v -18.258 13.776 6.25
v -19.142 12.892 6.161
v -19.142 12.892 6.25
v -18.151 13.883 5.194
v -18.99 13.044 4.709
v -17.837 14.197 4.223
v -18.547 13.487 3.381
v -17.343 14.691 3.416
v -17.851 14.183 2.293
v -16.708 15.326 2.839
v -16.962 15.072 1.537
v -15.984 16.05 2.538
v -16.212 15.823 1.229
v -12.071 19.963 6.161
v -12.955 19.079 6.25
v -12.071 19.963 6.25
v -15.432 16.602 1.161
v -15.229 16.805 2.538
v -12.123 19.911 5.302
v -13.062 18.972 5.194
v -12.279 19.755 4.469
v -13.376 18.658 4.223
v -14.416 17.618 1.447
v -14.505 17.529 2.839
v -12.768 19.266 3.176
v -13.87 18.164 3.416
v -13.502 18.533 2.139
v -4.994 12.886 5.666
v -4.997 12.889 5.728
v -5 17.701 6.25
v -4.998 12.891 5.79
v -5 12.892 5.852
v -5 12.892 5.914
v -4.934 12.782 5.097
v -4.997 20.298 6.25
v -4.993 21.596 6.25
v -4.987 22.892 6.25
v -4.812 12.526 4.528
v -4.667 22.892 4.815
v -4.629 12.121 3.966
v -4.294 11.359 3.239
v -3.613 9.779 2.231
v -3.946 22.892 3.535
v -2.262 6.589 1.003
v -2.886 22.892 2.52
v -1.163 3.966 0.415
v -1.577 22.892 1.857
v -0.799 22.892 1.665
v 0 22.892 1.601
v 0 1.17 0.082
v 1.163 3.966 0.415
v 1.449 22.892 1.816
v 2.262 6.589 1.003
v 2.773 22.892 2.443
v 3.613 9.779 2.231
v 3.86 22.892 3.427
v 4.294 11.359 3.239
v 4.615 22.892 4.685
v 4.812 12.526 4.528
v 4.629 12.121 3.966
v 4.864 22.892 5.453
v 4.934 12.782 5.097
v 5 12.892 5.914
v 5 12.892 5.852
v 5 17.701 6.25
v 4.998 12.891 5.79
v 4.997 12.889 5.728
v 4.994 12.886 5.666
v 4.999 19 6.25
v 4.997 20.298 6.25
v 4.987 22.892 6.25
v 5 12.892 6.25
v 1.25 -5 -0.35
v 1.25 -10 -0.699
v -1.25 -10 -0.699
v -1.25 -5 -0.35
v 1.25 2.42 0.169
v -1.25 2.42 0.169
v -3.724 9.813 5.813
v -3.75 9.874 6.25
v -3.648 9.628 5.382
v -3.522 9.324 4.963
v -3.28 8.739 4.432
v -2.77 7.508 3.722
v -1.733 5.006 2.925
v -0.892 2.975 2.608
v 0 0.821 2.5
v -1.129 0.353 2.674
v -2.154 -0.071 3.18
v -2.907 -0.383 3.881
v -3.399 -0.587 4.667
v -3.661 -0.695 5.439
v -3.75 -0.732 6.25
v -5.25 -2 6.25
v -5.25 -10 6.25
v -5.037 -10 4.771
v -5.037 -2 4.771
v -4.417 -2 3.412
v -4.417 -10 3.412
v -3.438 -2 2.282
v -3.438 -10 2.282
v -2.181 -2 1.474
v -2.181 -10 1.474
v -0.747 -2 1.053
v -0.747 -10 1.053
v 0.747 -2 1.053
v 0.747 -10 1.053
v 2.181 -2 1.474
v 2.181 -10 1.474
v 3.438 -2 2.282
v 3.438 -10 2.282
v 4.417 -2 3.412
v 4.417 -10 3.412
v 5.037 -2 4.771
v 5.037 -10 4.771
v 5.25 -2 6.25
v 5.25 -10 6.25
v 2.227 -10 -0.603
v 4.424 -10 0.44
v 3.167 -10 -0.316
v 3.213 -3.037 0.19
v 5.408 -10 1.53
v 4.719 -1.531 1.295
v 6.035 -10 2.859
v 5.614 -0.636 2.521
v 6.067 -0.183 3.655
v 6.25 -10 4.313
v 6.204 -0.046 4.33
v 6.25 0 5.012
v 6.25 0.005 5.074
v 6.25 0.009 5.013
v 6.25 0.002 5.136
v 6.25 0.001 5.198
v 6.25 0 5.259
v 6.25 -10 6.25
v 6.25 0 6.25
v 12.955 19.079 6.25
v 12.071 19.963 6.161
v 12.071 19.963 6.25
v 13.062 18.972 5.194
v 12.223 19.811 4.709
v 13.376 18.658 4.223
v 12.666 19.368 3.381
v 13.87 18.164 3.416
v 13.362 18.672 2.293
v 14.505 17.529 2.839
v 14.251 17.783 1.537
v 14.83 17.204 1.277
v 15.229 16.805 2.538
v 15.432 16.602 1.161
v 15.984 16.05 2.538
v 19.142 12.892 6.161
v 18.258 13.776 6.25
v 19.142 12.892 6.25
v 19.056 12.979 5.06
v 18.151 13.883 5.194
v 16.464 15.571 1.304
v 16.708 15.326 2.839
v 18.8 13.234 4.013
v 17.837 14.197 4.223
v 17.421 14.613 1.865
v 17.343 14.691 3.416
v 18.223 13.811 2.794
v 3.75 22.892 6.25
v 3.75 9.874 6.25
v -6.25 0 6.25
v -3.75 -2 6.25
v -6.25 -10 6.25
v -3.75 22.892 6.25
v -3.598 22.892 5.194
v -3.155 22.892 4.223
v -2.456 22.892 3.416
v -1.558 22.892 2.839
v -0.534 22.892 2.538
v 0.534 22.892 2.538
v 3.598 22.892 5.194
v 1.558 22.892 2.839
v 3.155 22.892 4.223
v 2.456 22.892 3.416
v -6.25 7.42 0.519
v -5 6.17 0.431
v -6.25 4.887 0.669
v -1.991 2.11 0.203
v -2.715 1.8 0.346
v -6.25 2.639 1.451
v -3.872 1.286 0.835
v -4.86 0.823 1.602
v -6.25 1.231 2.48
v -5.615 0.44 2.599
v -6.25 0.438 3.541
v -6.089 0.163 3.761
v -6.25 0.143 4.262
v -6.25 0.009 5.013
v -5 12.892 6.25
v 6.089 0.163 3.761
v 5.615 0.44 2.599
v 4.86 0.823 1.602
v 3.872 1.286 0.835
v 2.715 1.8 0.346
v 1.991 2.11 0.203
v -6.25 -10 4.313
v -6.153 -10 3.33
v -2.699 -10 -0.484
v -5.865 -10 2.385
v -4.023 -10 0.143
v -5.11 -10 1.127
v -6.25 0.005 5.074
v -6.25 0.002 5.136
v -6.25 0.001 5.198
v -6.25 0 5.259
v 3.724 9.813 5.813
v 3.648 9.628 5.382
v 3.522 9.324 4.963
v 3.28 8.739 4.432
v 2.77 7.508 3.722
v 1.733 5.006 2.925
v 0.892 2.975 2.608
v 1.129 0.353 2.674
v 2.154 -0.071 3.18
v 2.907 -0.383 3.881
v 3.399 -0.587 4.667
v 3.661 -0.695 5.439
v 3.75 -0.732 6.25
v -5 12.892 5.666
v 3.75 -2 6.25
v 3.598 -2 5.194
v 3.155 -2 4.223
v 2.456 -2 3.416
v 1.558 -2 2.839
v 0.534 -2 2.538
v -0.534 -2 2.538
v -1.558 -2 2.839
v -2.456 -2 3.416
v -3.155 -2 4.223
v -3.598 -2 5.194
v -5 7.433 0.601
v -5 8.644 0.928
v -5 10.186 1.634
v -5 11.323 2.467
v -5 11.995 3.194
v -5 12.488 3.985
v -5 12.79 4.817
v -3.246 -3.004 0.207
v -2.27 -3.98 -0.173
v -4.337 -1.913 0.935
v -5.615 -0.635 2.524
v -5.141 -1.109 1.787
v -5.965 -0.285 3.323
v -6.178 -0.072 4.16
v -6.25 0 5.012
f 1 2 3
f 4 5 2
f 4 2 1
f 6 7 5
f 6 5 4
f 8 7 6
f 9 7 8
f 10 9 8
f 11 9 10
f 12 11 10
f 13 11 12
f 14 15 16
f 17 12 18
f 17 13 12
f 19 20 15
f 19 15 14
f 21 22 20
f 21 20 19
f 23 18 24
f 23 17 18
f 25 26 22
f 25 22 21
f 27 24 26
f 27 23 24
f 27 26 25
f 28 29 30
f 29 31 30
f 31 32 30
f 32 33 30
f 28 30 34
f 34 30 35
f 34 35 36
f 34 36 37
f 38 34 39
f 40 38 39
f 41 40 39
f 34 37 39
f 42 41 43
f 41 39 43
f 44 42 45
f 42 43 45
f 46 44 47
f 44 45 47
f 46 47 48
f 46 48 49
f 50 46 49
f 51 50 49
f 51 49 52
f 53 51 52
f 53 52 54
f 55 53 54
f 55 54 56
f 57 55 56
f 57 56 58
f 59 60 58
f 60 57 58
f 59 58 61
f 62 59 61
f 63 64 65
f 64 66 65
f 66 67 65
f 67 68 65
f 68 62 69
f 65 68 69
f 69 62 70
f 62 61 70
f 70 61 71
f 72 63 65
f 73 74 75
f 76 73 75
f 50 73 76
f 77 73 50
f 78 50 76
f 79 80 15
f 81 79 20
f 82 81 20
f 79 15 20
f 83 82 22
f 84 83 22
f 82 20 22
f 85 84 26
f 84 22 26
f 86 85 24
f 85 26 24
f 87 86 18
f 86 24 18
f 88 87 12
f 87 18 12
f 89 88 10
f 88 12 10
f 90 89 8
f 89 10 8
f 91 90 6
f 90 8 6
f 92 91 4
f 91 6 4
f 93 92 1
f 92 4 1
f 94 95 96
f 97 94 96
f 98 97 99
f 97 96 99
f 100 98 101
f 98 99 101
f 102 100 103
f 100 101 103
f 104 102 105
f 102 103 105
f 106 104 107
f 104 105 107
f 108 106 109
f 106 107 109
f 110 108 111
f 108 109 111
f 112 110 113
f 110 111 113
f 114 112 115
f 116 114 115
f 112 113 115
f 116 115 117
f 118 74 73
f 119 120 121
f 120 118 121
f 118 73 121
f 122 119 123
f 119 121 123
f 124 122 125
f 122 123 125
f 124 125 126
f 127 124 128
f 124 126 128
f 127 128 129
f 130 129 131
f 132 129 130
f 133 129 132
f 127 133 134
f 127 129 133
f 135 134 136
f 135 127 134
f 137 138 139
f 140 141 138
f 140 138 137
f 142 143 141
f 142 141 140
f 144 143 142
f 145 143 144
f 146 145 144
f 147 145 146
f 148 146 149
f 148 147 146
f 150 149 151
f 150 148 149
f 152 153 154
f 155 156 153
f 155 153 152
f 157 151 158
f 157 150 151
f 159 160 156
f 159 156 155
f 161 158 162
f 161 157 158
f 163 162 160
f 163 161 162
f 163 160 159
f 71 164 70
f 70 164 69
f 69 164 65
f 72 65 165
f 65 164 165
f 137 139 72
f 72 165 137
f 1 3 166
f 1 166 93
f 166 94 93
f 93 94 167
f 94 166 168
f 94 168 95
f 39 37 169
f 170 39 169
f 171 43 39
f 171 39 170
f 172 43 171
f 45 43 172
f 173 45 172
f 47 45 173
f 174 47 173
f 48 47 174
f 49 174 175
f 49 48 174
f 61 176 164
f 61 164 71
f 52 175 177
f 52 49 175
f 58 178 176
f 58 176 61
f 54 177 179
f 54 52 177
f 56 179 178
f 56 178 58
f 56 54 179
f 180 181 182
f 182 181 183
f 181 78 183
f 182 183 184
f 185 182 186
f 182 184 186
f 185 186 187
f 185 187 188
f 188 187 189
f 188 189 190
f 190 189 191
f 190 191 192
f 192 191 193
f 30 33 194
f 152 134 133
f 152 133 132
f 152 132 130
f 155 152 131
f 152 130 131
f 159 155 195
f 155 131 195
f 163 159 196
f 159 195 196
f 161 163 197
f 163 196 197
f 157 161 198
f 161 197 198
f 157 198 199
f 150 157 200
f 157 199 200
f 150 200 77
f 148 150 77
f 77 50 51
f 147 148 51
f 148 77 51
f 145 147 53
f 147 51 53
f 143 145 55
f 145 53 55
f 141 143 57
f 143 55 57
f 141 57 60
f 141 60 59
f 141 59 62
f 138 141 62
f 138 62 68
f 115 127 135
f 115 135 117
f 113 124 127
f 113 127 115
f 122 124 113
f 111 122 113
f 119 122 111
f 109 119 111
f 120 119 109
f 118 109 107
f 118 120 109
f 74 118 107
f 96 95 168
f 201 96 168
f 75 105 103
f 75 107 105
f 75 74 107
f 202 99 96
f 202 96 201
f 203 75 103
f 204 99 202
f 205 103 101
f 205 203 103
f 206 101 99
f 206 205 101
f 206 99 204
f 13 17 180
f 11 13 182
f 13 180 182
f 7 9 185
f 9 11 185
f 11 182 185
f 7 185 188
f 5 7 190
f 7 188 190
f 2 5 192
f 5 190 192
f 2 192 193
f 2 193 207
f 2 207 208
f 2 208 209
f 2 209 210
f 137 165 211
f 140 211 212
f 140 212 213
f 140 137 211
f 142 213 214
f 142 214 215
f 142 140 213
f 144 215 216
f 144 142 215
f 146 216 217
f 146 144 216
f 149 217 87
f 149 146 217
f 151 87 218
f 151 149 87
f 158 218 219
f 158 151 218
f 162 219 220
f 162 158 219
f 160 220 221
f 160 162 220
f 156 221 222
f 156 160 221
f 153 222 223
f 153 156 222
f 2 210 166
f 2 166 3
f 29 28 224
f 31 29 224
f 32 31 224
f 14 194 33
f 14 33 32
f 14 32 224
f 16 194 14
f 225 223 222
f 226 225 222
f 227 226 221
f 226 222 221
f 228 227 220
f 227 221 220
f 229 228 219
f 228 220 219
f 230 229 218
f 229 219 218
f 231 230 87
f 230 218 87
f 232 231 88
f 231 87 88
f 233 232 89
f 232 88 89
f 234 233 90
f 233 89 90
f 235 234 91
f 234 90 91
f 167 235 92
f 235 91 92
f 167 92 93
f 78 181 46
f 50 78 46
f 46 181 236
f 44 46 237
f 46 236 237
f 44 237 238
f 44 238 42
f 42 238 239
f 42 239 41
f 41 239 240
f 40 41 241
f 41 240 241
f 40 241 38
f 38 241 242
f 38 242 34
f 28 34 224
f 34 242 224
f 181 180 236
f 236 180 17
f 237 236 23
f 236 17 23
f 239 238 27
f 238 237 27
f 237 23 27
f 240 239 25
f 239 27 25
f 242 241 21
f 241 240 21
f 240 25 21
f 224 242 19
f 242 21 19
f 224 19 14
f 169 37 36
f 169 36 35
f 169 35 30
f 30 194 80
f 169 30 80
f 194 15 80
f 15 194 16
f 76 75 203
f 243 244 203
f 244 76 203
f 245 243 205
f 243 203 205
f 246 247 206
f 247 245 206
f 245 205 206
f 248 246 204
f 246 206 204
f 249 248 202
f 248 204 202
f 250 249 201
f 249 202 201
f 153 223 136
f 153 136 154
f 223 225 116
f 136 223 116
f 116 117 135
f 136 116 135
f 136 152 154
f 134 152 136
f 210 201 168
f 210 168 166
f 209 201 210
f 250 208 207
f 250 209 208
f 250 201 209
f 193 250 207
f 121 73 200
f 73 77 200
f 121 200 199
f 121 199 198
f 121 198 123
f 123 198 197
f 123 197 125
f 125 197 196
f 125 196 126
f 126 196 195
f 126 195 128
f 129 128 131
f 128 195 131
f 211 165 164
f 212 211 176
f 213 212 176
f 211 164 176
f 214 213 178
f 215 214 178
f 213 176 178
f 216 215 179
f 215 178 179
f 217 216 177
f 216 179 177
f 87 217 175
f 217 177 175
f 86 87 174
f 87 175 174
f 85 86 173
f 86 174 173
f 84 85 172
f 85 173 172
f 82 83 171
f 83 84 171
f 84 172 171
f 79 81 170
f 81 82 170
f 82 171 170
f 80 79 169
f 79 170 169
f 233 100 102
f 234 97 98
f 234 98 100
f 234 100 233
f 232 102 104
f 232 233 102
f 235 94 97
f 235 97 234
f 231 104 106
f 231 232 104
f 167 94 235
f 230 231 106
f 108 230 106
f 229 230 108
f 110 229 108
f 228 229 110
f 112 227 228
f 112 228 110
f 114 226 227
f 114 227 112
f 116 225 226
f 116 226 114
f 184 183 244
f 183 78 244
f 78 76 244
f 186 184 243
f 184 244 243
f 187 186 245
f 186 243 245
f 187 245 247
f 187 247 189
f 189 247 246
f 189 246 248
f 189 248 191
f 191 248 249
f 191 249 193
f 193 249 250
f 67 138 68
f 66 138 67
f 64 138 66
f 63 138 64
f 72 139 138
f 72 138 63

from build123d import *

# Parameters (mm, degrees)
EXTRUDE_634_DEPTH           = 12.5
SKETCH_4_R                  = 3.75
CUT_EXTRUDE_991_DEPTH       = 41.057008652
CUT_EXTRUDE_1141_REACH      = 47.49
CUT_EXTRUDE_1141_END_RADIUS = 3.75
SKETCH_5_R                  = 3.75
SKETCH_9_R                  = 5.25
CUT_EXTRUDE_1315_DEPTH      = 8
DRAFT_2_ANGLE               = 4
FILLET_8_R                  = 5
SKETCH_10_W                 = 49.037593782
SKETCH_10_H                 = 8.594475989
CUT_EXTRUDE_3_DEPTH         = 41.280697872


with BuildPart() as part:
    # Эскиз3 → Extrude 634 (new body)
    with BuildSketch(Plane.XY):
        Polygon((-6.25, 0), (-19.142135624, 12.892135624), (-12.071067812, 19.963203436), (-5, 12.892135624), (-5, 22.892135624), (5, 22.892135624), (5, 12.892135624), (12.071067812, 19.963203436), (19.142135624, 12.892135624), (6.25, 0), (6.25, -10), (-6.25, -10), align=None)
    extrude(amount=EXTRUDE_634_DEPTH)

    # Эскиз4 → Cut-Extrude 991 (cut, through all)
    with BuildSketch(Plane(origin=(0, 22.892135624, 0), x_dir=(-1, 0, 0), z_dir=(0, 1, 0))):
        with Locations(Location((0, 6.25, 0), (0, 0, 90))):
            Circle(SKETCH_4_R)
    extrude(amount=-CUT_EXTRUDE_991_DEPTH, mode=Mode.SUBTRACT)

    # Cut-Extrude 1141: up to this cylinder (the profile starts outside it)
    cut_extrude_1141_end = Plane(origin=(0, 16.42767, 6.25), z_dir=(0, 1, 0)) * Cylinder(CUT_EXTRUDE_1141_END_RADIUS, 103.48, mode=Mode.PRIVATE)
    # Эскиз5 → Cut-Extrude 1141 (cut, up to the surface)
    with BuildSketch(Plane(origin=(-16.017135624, 16.017135624, 0), x_dir=(0, 0, 1), z_dir=(-0.707106781186544, 0.7071067811865511, 0)), mode=Mode.PRIVATE) as cut_extrude_1141_sk1:
        with Locations(Location((6.25, 0.580582618, 0), (0, 0, 270))):
            Circle(SKETCH_5_R)
    cut_extrude_1141_tool1 = extrude(cut_extrude_1141_sk1.sketch, amount=-CUT_EXTRUDE_1141_REACH, mode=Mode.PRIVATE) - cut_extrude_1141_end
    cut_extrude_1141 = cut_extrude_1141_tool1.solids().sort_by_distance((-15.606602, 16.42767, 6.25))[0]
    add(cut_extrude_1141, mode=Mode.SUBTRACT)

    # Зеркальное отражение1: Cut-Extrude 1141 across plane
    add(cut_extrude_1141.mirror(Plane(origin=(0, 0, 0), x_dir=(0, 0, 1), z_dir=(1, 0, 0))), mode=Mode.SUBTRACT)

    # Эскиз9 → Cut-Extrude 1315 (cut)
    with BuildSketch(Plane.XZ.offset(10)):
        with Locations((0, 6.25)):
            Circle(SKETCH_9_R)
    extrude(amount=-CUT_EXTRUDE_1315_DEPTH, mode=Mode.SUBTRACT)

    # Уклон2
    draft_2_faces = [part.faces().sort_by_distance(p)[0] for p in [
        (0, 7.90429112, 0),
        (0, 7.90429112, 12.5),
    ]]
    draft(draft_2_faces, Plane.ZX, DRAFT_2_ANGLE)

    # Скругление8
    # the kernel refuses this fillet: 5 mm, written as the material it takes off along each edge
    with BuildSketch(Plane(origin=(-3.402831812, 4.489303811, 0.313922703), x_dir=(0.707968543318461, -0.7045235927201029, -0.049265088777904954), z_dir=(0.7062439675293066, 0.7062439675293118, 0.04938538910366094))) as fillet_8_piece_1_section:
        with BuildLine():
            CenterArc((FILLET_8_R * 0.951833326591, -FILLET_8_R), FILLET_8_R, 90, 87.17272264)
            Line((-FILLET_8_R * 0.0469494411747, -FILLET_8_R * 0.950674724384), (-FILLET_8_R * 0.06692509653, -FILLET_8_R * 0.949688218872))
            Line((-FILLET_8_R * 0.06692509653, -FILLET_8_R * 0.949688218872), (-FILLET_8_R * 0.0190366665318, FILLET_8_R * 0.02))
            Line((-FILLET_8_R * 0.0190366665318, FILLET_8_R * 0.02), (FILLET_8_R * 0.951833326591, FILLET_8_R * 0.02))
            Line((FILLET_8_R * 0.951833326591, FILLET_8_R * 0.02), (FILLET_8_R * 0.951833326591, 0))
        make_face()
    fillet_8_piece_1 = extrude(amount=33.8080501, mode=Mode.PRIVATE)
    fillet_8_piece_1 = split(fillet_8_piece_1, bisect_by=Plane(origin=(12.895577991, 19.138693257, 2.078418466), z_dir=(-0.7071067811865445, -0.7071067811865507, 0)), keep=Keep.TOP, mode=Mode.PRIVATE)
    fillet_8_piece_1 = split(fillet_8_piece_1, bisect_by=Plane(origin=(5, 15.190904261, 2.078418466), z_dir=(1, 0, 0)), keep=Keep.TOP, mode=Mode.PRIVATE)
    add(fillet_8_piece_1, mode=Mode.SUBTRACT)
    with BuildSketch(Plane(origin=(5, 35.361686252, 2.472729985), x_dir=(-1, 0, 0), z_dir=(0, -0.9975640502598243, -0.06975647374412541))) as fillet_8_piece_2_section:
        with BuildLine():
            CenterArc((FILLET_8_R, -FILLET_8_R), FILLET_8_R, 90, 90)
            Line((0, -FILLET_8_R), (-FILLET_8_R * 0.02, -FILLET_8_R))
            Line((-FILLET_8_R * 0.02, -FILLET_8_R), (-FILLET_8_R * 0.02, FILLET_8_R * 0.02))
            Line((-FILLET_8_R * 0.02, FILLET_8_R * 0.02), (FILLET_8_R, FILLET_8_R * 0.02))
            Line((FILLET_8_R, FILLET_8_R * 0.02), (FILLET_8_R, 0))
        make_face()
    fillet_8_piece_2 = extrude(amount=35.024418981, mode=Mode.PRIVATE)
    fillet_8_piece_2 = split(fillet_8_piece_2, bisect_by=Plane(origin=(3.763647995, 22.892135624, 2.280840285), z_dir=(0, -1, 0)), keep=Keep.TOP, mode=Mode.PRIVATE)
    fillet_8_piece_2 = split(fillet_8_piece_2, bisect_by=Plane(origin=(6.572735996, 14.46487162, 2.280840285), z_dir=(-0.7071067811865501, 0.707106781186545, 0)), keep=Keep.TOP, mode=Mode.PRIVATE)
    add(fillet_8_piece_2, mode=Mode.SUBTRACT)
    with BuildSketch(Plane(origin=(-5, 0.422584995, 0.029550022), x_dir=(1, 0, 0), z_dir=(0, 0.9975640502598243, 0.06975647374412541))) as fillet_8_piece_3_section:
        with BuildLine():
            CenterArc((FILLET_8_R, -FILLET_8_R), FILLET_8_R, 90, 90)
            Line((0, -FILLET_8_R), (-FILLET_8_R * 0.02, -FILLET_8_R))
            Line((-FILLET_8_R * 0.02, -FILLET_8_R), (-FILLET_8_R * 0.02, FILLET_8_R * 0.02))
            Line((-FILLET_8_R * 0.02, FILLET_8_R * 0.02), (FILLET_8_R, FILLET_8_R * 0.02))
            Line((FILLET_8_R, FILLET_8_R * 0.02), (FILLET_8_R, 0))
        make_face()
    fillet_8_piece_3 = extrude(amount=35.024418981, mode=Mode.PRIVATE)
    fillet_8_piece_3 = split(fillet_8_piece_3, bisect_by=Plane(origin=(-3.763647995, 22.892135624, 2.280840285), z_dir=(0, -1, 0)), keep=Keep.TOP, mode=Mode.PRIVATE)
    fillet_8_piece_3 = split(fillet_8_piece_3, bisect_by=Plane(origin=(-6.572735996, 14.46487162, 2.280840285), z_dir=(0.7071067811865512, 0.7071067811865438, 0)), keep=Keep.TOP, mode=Mode.PRIVATE)
    add(fillet_8_piece_3, mode=Mode.SUBTRACT)
    with BuildSketch(Plane(origin=(-20.473899624, 28.366035248, 1.983546412), x_dir=(-0.707968543318462, -0.7045235927201018, -0.04926508877790491), z_dir=(0.7062439675293055, -0.706243967529313, -0.04938538910366102))) as fillet_8_piece_4_section:
        with BuildLine():
            CenterArc((FILLET_8_R * 0.951833326591, -FILLET_8_R), FILLET_8_R, 90, 87.17272264)
            Line((-FILLET_8_R * 0.0469494411747, -FILLET_8_R * 0.950674724384), (-FILLET_8_R * 0.06692509653, -FILLET_8_R * 0.949688218872))
            Line((-FILLET_8_R * 0.06692509653, -FILLET_8_R * 0.949688218872), (-FILLET_8_R * 0.0190366665318, FILLET_8_R * 0.02))
            Line((-FILLET_8_R * 0.0190366665318, FILLET_8_R * 0.02), (FILLET_8_R * 0.951833326591, FILLET_8_R * 0.02))
            Line((FILLET_8_R * 0.951833326591, FILLET_8_R * 0.02), (FILLET_8_R * 0.951833326591, 0))
        make_face()
    fillet_8_piece_4 = extrude(amount=33.8080501, mode=Mode.PRIVATE)
    fillet_8_piece_4 = split(fillet_8_piece_4, bisect_by=Plane(origin=(-12.895577991, 19.138693257, 2.078418466), z_dir=(0.7071067811865444, -0.7071067811865508, 0)), keep=Keep.TOP, mode=Mode.PRIVATE)
    fillet_8_piece_4 = split(fillet_8_piece_4, bisect_by=Plane(origin=(-5, 15.190904261, 2.078418466), z_dir=(-1, 0, 0)), keep=Keep.TOP, mode=Mode.PRIVATE)
    add(fillet_8_piece_4, mode=Mode.SUBTRACT)
    with BuildSketch(Plane(origin=(3.024785141, -9.274785141, -0.648556156), x_dir=(0.034920743526734764, -0.034920743526734764, 0.9987797972241329), z_dir=(-0.7062439675293093, 0.7062439675293093, 0.04938538910366077))) as fillet_8_piece_5_section:
        with BuildLine():
            CenterArc((FILLET_8_R * 1.0506041048, FILLET_8_R), FILLET_8_R, 177.17272264, 92.82727736)
            Line((FILLET_8_R * 0.0518213370326, FILLET_8_R * 1.04932527562), (FILLET_8_R * 0.0318456816773, FILLET_8_R * 1.05031178113))
            Line((FILLET_8_R * 0.0318456816773, FILLET_8_R * 1.05031178113), (-FILLET_8_R * 0.021012082096, -FILLET_8_R * 0.02))
            Line((-FILLET_8_R * 0.021012082096, -FILLET_8_R * 0.02), (FILLET_8_R * 1.0506041048, -FILLET_8_R * 0.02))
            Line((FILLET_8_R * 1.0506041048, -FILLET_8_R * 0.02), (FILLET_8_R * 1.0506041048, 0))
        make_face()
    fillet_8_piece_5 = extrude(amount=44.519609867, mode=Mode.PRIVATE)
    fillet_8_piece_5 = split(fillet_8_piece_5, bisect_by=Plane(origin=(-6.25, 7.634264741, 1.775571736), z_dir=(-1, 0, 0)), keep=Keep.TOP, mode=Mode.PRIVATE)
    fillet_8_piece_5 = split(fillet_8_piece_5, bisect_by=Plane(origin=(-18.350004337, 13.68426691, 1.775571736), z_dir=(0.7071067811865444, -0.7071067811865508, 0)), keep=Keep.TOP, mode=Mode.PRIVATE)
    add(fillet_8_piece_5, mode=Mode.SUBTRACT)
    with BuildSketch(Plane(origin=(-6.25, -22.469550628, -1.571224041), x_dir=(0, -0.06975647374412541, 0.9975640502598242), z_dir=(0, 0.9975640502598243, 0.06975647374412541))) as fillet_8_piece_6_section:
        with BuildLine():
            CenterArc((FILLET_8_R, FILLET_8_R), FILLET_8_R, 180, 90)
            Line((0, FILLET_8_R), (-FILLET_8_R * 0.02, FILLET_8_R))
            Line((-FILLET_8_R * 0.02, FILLET_8_R), (-FILLET_8_R * 0.02, -FILLET_8_R * 0.02))
            Line((-FILLET_8_R * 0.02, -FILLET_8_R * 0.02), (FILLET_8_R, -FILLET_8_R * 0.02))
            Line((FILLET_8_R, -FILLET_8_R * 0.02), (FILLET_8_R, 0))
        make_face()
    fillet_8_piece_6 = extrude(amount=35.024418981, mode=Mode.PRIVATE)
    fillet_8_piece_6 = split(fillet_8_piece_6, bisect_by=Plane(origin=(-2.999285634, -3.250714366, 0.827701668), z_dir=(-0.7071067811865476, -0.7071067811865476, 0)), keep=Keep.TOP, mode=Mode.PRIVATE)
    fillet_8_piece_6 = split(fillet_8_piece_6, bisect_by=Plane(origin=(-5.249047512, -10, 0.827701668), z_dir=(0, 1, 0)), keep=Keep.TOP, mode=Mode.PRIVATE)
    add(fillet_8_piece_6, mode=Mode.SUBTRACT)
    with BuildSketch(Plane(origin=(6.25, 12.469550628, 0.871955922), x_dir=(-1, 0, 0), z_dir=(0, -0.9975640502598243, -0.06975647374412541))) as fillet_8_piece_7_section:
        with BuildLine():
            CenterArc((FILLET_8_R, -FILLET_8_R), FILLET_8_R, 90, 90)
            Line((0, -FILLET_8_R), (-FILLET_8_R * 0.02, -FILLET_8_R))
            Line((-FILLET_8_R * 0.02, -FILLET_8_R), (-FILLET_8_R * 0.02, FILLET_8_R * 0.02))
            Line((-FILLET_8_R * 0.02, FILLET_8_R * 0.02), (FILLET_8_R, FILLET_8_R * 0.02))
            Line((FILLET_8_R, FILLET_8_R * 0.02), (FILLET_8_R, 0))
        make_face()
    fillet_8_piece_7 = extrude(amount=35.024418981, mode=Mode.PRIVATE)
    fillet_8_piece_7 = split(fillet_8_piece_7, bisect_by=Plane(origin=(5.249047512, -10, 0.827701668), z_dir=(0, 1, 0)), keep=Keep.TOP, mode=Mode.PRIVATE)
    fillet_8_piece_7 = split(fillet_8_piece_7, bisect_by=Plane(origin=(2.999285634, -3.250714366, 0.827701668), z_dir=(0.7071067811865476, -0.7071067811865476, 0)), keep=Keep.TOP, mode=Mode.PRIVATE)
    add(fillet_8_piece_7, mode=Mode.SUBTRACT)
    with BuildSketch(Plane(origin=(28.416920765, 22.166920765, 1.5500621), x_dir=(-0.7079685433184584, 0.7045235927201055, 0.04926508877790521), z_dir=(-0.7062439675293093, -0.7062439675293093, -0.04938538910366077))) as fillet_8_piece_8_section:
        with BuildLine():
            CenterArc((FILLET_8_R * 1.0506041048, -FILLET_8_R), FILLET_8_R, 90, 92.82727736)
            Line((FILLET_8_R * 0.0518213370326, -FILLET_8_R * 1.04932527562), (FILLET_8_R * 0.0318456816773, -FILLET_8_R * 1.05031178113))
            Line((FILLET_8_R * 0.0318456816773, -FILLET_8_R * 1.05031178113), (-FILLET_8_R * 0.021012082096, FILLET_8_R * 0.02))
            Line((-FILLET_8_R * 0.021012082096, FILLET_8_R * 0.02), (FILLET_8_R * 1.0506041048, FILLET_8_R * 0.02))
            Line((FILLET_8_R * 1.0506041048, FILLET_8_R * 0.02), (FILLET_8_R * 1.0506041048, 0))
        make_face()
    fillet_8_piece_8 = extrude(amount=44.519609867, mode=Mode.PRIVATE)
    fillet_8_piece_8 = split(fillet_8_piece_8, bisect_by=Plane(origin=(18.350004337, 13.68426691, 1.775571736), z_dir=(-0.7071067811865445, -0.7071067811865507, 0)), keep=Keep.TOP, mode=Mode.PRIVATE)
    fillet_8_piece_8 = split(fillet_8_piece_8, bisect_by=Plane(origin=(6.25, 7.634264741, 1.775571736), z_dir=(1, 0, 0)), keep=Keep.TOP, mode=Mode.PRIVATE)
    add(fillet_8_piece_8, mode=Mode.SUBTRACT)
    with BuildSketch(Plane(origin=(-6.25, -22.469550628, 14.071224041), x_dir=(0, -0.06975647374412541, -0.9975640502598242), z_dir=(0, 0.9975640502598243, -0.06975647374412541))) as fillet_8_piece_9_section:
        with BuildLine():
            CenterArc((FILLET_8_R, -FILLET_8_R), FILLET_8_R, 90, 90)
            Line((0, -FILLET_8_R), (-FILLET_8_R * 0.02, -FILLET_8_R))
            Line((-FILLET_8_R * 0.02, -FILLET_8_R), (-FILLET_8_R * 0.02, FILLET_8_R * 0.02))
            Line((-FILLET_8_R * 0.02, FILLET_8_R * 0.02), (FILLET_8_R, FILLET_8_R * 0.02))
            Line((FILLET_8_R, FILLET_8_R * 0.02), (FILLET_8_R, 0))
        make_face()
    fillet_8_piece_9 = extrude(amount=35.024418981, mode=Mode.PRIVATE)
    fillet_8_piece_9 = split(fillet_8_piece_9, bisect_by=Plane(origin=(-2.999285634, -3.250714366, 11.672298332), z_dir=(-0.7071067811865476, -0.7071067811865476, 0)), keep=Keep.TOP, mode=Mode.PRIVATE)
    fillet_8_piece_9 = split(fillet_8_piece_9, bisect_by=Plane(origin=(-5.249047512, -10, 11.672298332), z_dir=(0, 1, 0)), keep=Keep.TOP, mode=Mode.PRIVATE)
    add(fillet_8_piece_9, mode=Mode.SUBTRACT)
    with BuildSketch(Plane(origin=(6.25, 12.469550628, 11.628044078), x_dir=(-1, 0, 0), z_dir=(0, -0.9975640502598243, 0.06975647374412541))) as fillet_8_piece_10_section:
        with BuildLine():
            CenterArc((FILLET_8_R, FILLET_8_R), FILLET_8_R, 180, 90)
            Line((0, FILLET_8_R), (-FILLET_8_R * 0.02, FILLET_8_R))
            Line((-FILLET_8_R * 0.02, FILLET_8_R), (-FILLET_8_R * 0.02, -FILLET_8_R * 0.02))
            Line((-FILLET_8_R * 0.02, -FILLET_8_R * 0.02), (FILLET_8_R, -FILLET_8_R * 0.02))
            Line((FILLET_8_R, -FILLET_8_R * 0.02), (FILLET_8_R, 0))
        make_face()
    fillet_8_piece_10 = extrude(amount=35.024418981, mode=Mode.PRIVATE)
    fillet_8_piece_10 = split(fillet_8_piece_10, bisect_by=Plane(origin=(5.249047512, -10, 11.672298332), z_dir=(0, 1, 0)), keep=Keep.TOP, mode=Mode.PRIVATE)
    fillet_8_piece_10 = split(fillet_8_piece_10, bisect_by=Plane(origin=(2.999285634, -3.250714366, 11.672298332), z_dir=(0.7071067811865476, -0.7071067811865476, 0)), keep=Keep.TOP, mode=Mode.PRIVATE)
    add(fillet_8_piece_10, mode=Mode.SUBTRACT)
    with BuildSketch(Plane(origin=(28.416920765, 22.166920765, 10.9499379), x_dir=(-0.7079685433184584, 0.7045235927201055, -0.049265088777905426), z_dir=(-0.7062439675293093, -0.7062439675293093, 0.04938538910366077))) as fillet_8_piece_11_section:
        with BuildLine():
            CenterArc((FILLET_8_R * 1.0506041048, FILLET_8_R), FILLET_8_R, 177.17272264, 92.82727736)
            Line((FILLET_8_R * 0.0518213370326, FILLET_8_R * 1.04932527562), (FILLET_8_R * 0.0318456816773, FILLET_8_R * 1.05031178113))
            Line((FILLET_8_R * 0.0318456816773, FILLET_8_R * 1.05031178113), (-FILLET_8_R * 0.021012082096, -FILLET_8_R * 0.02))
            Line((-FILLET_8_R * 0.021012082096, -FILLET_8_R * 0.02), (FILLET_8_R * 1.0506041048, -FILLET_8_R * 0.02))
            Line((FILLET_8_R * 1.0506041048, -FILLET_8_R * 0.02), (FILLET_8_R * 1.0506041048, 0))
        make_face()
    fillet_8_piece_11 = extrude(amount=44.519609867, mode=Mode.PRIVATE)
    fillet_8_piece_11 = split(fillet_8_piece_11, bisect_by=Plane(origin=(18.350004337, 13.68426691, 10.724428264), z_dir=(-0.7071067811865445, -0.7071067811865507, 0)), keep=Keep.TOP, mode=Mode.PRIVATE)
    fillet_8_piece_11 = split(fillet_8_piece_11, bisect_by=Plane(origin=(6.25, 7.634264741, 10.724428264), z_dir=(1, 0, 0)), keep=Keep.TOP, mode=Mode.PRIVATE)
    add(fillet_8_piece_11, mode=Mode.SUBTRACT)
    with BuildSketch(Plane(origin=(-3.402831812, 4.489303811, 12.186077297), x_dir=(0.707968543318461, -0.7045235927201029, 0.04926508877790491), z_dir=(0.7062439675293066, 0.7062439675293118, -0.04938538910366094))) as fillet_8_piece_12_section:
        with BuildLine():
            CenterArc((FILLET_8_R * 0.951833326591, FILLET_8_R), FILLET_8_R, 182.82727736, 87.17272264)
            Line((-FILLET_8_R * 0.0469494411747, FILLET_8_R * 0.950674724384), (-FILLET_8_R * 0.06692509653, FILLET_8_R * 0.949688218872))
            Line((-FILLET_8_R * 0.06692509653, FILLET_8_R * 0.949688218872), (-FILLET_8_R * 0.0190366665318, -FILLET_8_R * 0.02))
            Line((-FILLET_8_R * 0.0190366665318, -FILLET_8_R * 0.02), (FILLET_8_R * 0.951833326591, -FILLET_8_R * 0.02))
            Line((FILLET_8_R * 0.951833326591, -FILLET_8_R * 0.02), (FILLET_8_R * 0.951833326591, 0))
        make_face()
    fillet_8_piece_12 = extrude(amount=33.8080501, mode=Mode.PRIVATE)
    fillet_8_piece_12 = split(fillet_8_piece_12, bisect_by=Plane(origin=(12.895577991, 19.138693257, 10.421581534), z_dir=(-0.7071067811865445, -0.7071067811865507, 0)), keep=Keep.TOP, mode=Mode.PRIVATE)
    fillet_8_piece_12 = split(fillet_8_piece_12, bisect_by=Plane(origin=(5, 15.190904261, 10.421581534), z_dir=(1, 0, 0)), keep=Keep.TOP, mode=Mode.PRIVATE)
    add(fillet_8_piece_12, mode=Mode.SUBTRACT)
    with BuildSketch(Plane(origin=(5, 35.361686252, 10.027270015), x_dir=(-1, 0, 0), z_dir=(0, -0.9975640502598243, 0.06975647374412541))) as fillet_8_piece_13_section:
        with BuildLine():
            CenterArc((FILLET_8_R, FILLET_8_R), FILLET_8_R, 180, 90)
            Line((0, FILLET_8_R), (-FILLET_8_R * 0.02, FILLET_8_R))
            Line((-FILLET_8_R * 0.02, FILLET_8_R), (-FILLET_8_R * 0.02, -FILLET_8_R * 0.02))
            Line((-FILLET_8_R * 0.02, -FILLET_8_R * 0.02), (FILLET_8_R, -FILLET_8_R * 0.02))
            Line((FILLET_8_R, -FILLET_8_R * 0.02), (FILLET_8_R, 0))
        make_face()
    fillet_8_piece_13 = extrude(amount=35.024418981, mode=Mode.PRIVATE)
    fillet_8_piece_13 = split(fillet_8_piece_13, bisect_by=Plane(origin=(3.763647995, 22.892135624, 10.219159715), z_dir=(0, -1, 0)), keep=Keep.TOP, mode=Mode.PRIVATE)
    fillet_8_piece_13 = split(fillet_8_piece_13, bisect_by=Plane(origin=(6.572735996, 14.46487162, 10.219159715), z_dir=(-0.7071067811865501, 0.707106781186545, 0)), keep=Keep.TOP, mode=Mode.PRIVATE)
    add(fillet_8_piece_13, mode=Mode.SUBTRACT)
    with BuildSketch(Plane(origin=(-5, 0.422584995, 12.470449978), x_dir=(1, 0, 0), z_dir=(0, 0.9975640502598243, -0.06975647374412541))) as fillet_8_piece_14_section:
        with BuildLine():
            CenterArc((FILLET_8_R, FILLET_8_R), FILLET_8_R, 180, 90)
            Line((0, FILLET_8_R), (-FILLET_8_R * 0.02, FILLET_8_R))
            Line((-FILLET_8_R * 0.02, FILLET_8_R), (-FILLET_8_R * 0.02, -FILLET_8_R * 0.02))
            Line((-FILLET_8_R * 0.02, -FILLET_8_R * 0.02), (FILLET_8_R, -FILLET_8_R * 0.02))
            Line((FILLET_8_R, -FILLET_8_R * 0.02), (FILLET_8_R, 0))
        make_face()
    fillet_8_piece_14 = extrude(amount=35.024418981, mode=Mode.PRIVATE)
    fillet_8_piece_14 = split(fillet_8_piece_14, bisect_by=Plane(origin=(-3.763647995, 22.892135624, 10.219159715), z_dir=(0, -1, 0)), keep=Keep.TOP, mode=Mode.PRIVATE)
    fillet_8_piece_14 = split(fillet_8_piece_14, bisect_by=Plane(origin=(-6.572735996, 14.46487162, 10.219159715), z_dir=(0.7071067811865512, 0.7071067811865438, 0)), keep=Keep.TOP, mode=Mode.PRIVATE)
    add(fillet_8_piece_14, mode=Mode.SUBTRACT)
    with BuildSketch(Plane(origin=(-20.473899624, 28.366035248, 10.516453588), x_dir=(-0.7079685433184622, -0.7045235927201017, 0.04926508877790538), z_dir=(0.7062439675293055, -0.706243967529313, 0.04938538910366102))) as fillet_8_piece_15_section:
        with BuildLine():
            CenterArc((FILLET_8_R * 0.951833326591, FILLET_8_R), FILLET_8_R, 182.82727736, 87.17272264)
            Line((-FILLET_8_R * 0.0469494411747, FILLET_8_R * 0.950674724384), (-FILLET_8_R * 0.06692509653, FILLET_8_R * 0.949688218872))
            Line((-FILLET_8_R * 0.06692509653, FILLET_8_R * 0.949688218872), (-FILLET_8_R * 0.0190366665318, -FILLET_8_R * 0.02))
            Line((-FILLET_8_R * 0.0190366665318, -FILLET_8_R * 0.02), (FILLET_8_R * 0.951833326591, -FILLET_8_R * 0.02))
            Line((FILLET_8_R * 0.951833326591, -FILLET_8_R * 0.02), (FILLET_8_R * 0.951833326591, 0))
        make_face()
    fillet_8_piece_15 = extrude(amount=33.8080501, mode=Mode.PRIVATE)
    fillet_8_piece_15 = split(fillet_8_piece_15, bisect_by=Plane(origin=(-12.895577991, 19.138693257, 10.421581534), z_dir=(0.7071067811865444, -0.7071067811865508, 0)), keep=Keep.TOP, mode=Mode.PRIVATE)
    fillet_8_piece_15 = split(fillet_8_piece_15, bisect_by=Plane(origin=(-5, 15.190904261, 10.421581534), z_dir=(-1, 0, 0)), keep=Keep.TOP, mode=Mode.PRIVATE)
    add(fillet_8_piece_15, mode=Mode.SUBTRACT)
    with BuildSketch(Plane(origin=(3.024785141, -9.274785141, 13.148556156), x_dir=(0.034920743526734764, -0.034920743526734764, -0.9987797972241329), z_dir=(-0.7062439675293093, 0.7062439675293093, -0.04938538910366077))) as fillet_8_piece_16_section:
        with BuildLine():
            CenterArc((FILLET_8_R * 1.0506041048, -FILLET_8_R), FILLET_8_R, 90, 92.82727736)
            Line((FILLET_8_R * 0.0518213370326, -FILLET_8_R * 1.04932527562), (FILLET_8_R * 0.0318456816773, -FILLET_8_R * 1.05031178113))
            Line((FILLET_8_R * 0.0318456816773, -FILLET_8_R * 1.05031178113), (-FILLET_8_R * 0.021012082096, FILLET_8_R * 0.02))
            Line((-FILLET_8_R * 0.021012082096, FILLET_8_R * 0.02), (FILLET_8_R * 1.0506041048, FILLET_8_R * 0.02))
            Line((FILLET_8_R * 1.0506041048, FILLET_8_R * 0.02), (FILLET_8_R * 1.0506041048, 0))
        make_face()
    fillet_8_piece_16 = extrude(amount=44.519609867, mode=Mode.PRIVATE)
    fillet_8_piece_16 = split(fillet_8_piece_16, bisect_by=Plane(origin=(-6.25, 7.634264741, 10.724428264), z_dir=(-1, 0, 0)), keep=Keep.TOP, mode=Mode.PRIVATE)
    fillet_8_piece_16 = split(fillet_8_piece_16, bisect_by=Plane(origin=(-18.350004337, 13.68426691, 10.724428264), z_dir=(0.7071067811865444, -0.7071067811865508, 0)), keep=Keep.TOP, mode=Mode.PRIVATE)
    add(fillet_8_piece_16, mode=Mode.SUBTRACT)
    with BuildSketch(Plane(origin=(5, 35.361686252, 2.472729985), x_dir=(-1, 0, 0), z_dir=(0, -0.9975640502598243, -0.06975647374412541))) as fillet_8_piece_17a_section:
        with BuildLine():
            CenterArc((FILLET_8_R, -FILLET_8_R), FILLET_8_R, 90, 90)
            Line((0, -FILLET_8_R), (-FILLET_8_R * 0.02, -FILLET_8_R))
            Line((-FILLET_8_R * 0.02, -FILLET_8_R), (-FILLET_8_R * 0.02, FILLET_8_R * 0.02))
            Line((-FILLET_8_R * 0.02, FILLET_8_R * 0.02), (FILLET_8_R, FILLET_8_R * 0.02))
            Line((FILLET_8_R, FILLET_8_R * 0.02), (FILLET_8_R, 0))
        make_face()
    fillet_8_piece_17a = extrude(amount=35.024418981, mode=Mode.PRIVATE)
    fillet_8_piece_17a = split(fillet_8_piece_17a, bisect_by=Plane(origin=(1.092194354, 8.984329978, 1.628858747), z_dir=(0.7071067811865501, -0.707106781186545, 0)), keep=Keep.TOP, mode=Mode.PRIVATE)
    with BuildSketch(Plane(origin=(-3.402831812, 4.489303811, 0.313922703), x_dir=(0.707968543318461, -0.7045235927201029, -0.049265088777904954), z_dir=(0.7062439675293066, 0.7062439675293118, 0.04938538910366094))) as fillet_8_piece_17b_section:
        with BuildLine():
            CenterArc((FILLET_8_R * 0.951833326591, -FILLET_8_R), FILLET_8_R, 90, 87.17272264)
            Line((-FILLET_8_R * 0.0469494411747, -FILLET_8_R * 0.950674724384), (-FILLET_8_R * 0.06692509653, -FILLET_8_R * 0.949688218872))
            Line((-FILLET_8_R * 0.06692509653, -FILLET_8_R * 0.949688218872), (-FILLET_8_R * 0.0190366665318, FILLET_8_R * 0.02))
            Line((-FILLET_8_R * 0.0190366665318, FILLET_8_R * 0.02), (FILLET_8_R * 0.951833326591, FILLET_8_R * 0.02))
            Line((FILLET_8_R * 0.951833326591, FILLET_8_R * 0.02), (FILLET_8_R * 0.951833326591, 0))
        make_face()
    fillet_8_piece_17b = extrude(amount=33.8080501, mode=Mode.PRIVATE)
    fillet_8_piece_17b = split(fillet_8_piece_17b, bisect_by=Plane(origin=(5, 7.643322174, 1.670148542), z_dir=(-1, 0, 0)), keep=Keep.TOP, mode=Mode.PRIVATE)
    fillet_8_piece_17 = fillet_8_piece_17a & fillet_8_piece_17b
    add(fillet_8_piece_17, mode=Mode.SUBTRACT)
    with BuildSketch(Plane(origin=(-20.473899624, 28.366035248, 1.983546412), x_dir=(-0.707968543318462, -0.7045235927201018, -0.04926508877790491), z_dir=(0.7062439675293055, -0.706243967529313, -0.04938538910366102))) as fillet_8_piece_18a_section:
        with BuildLine():
            CenterArc((FILLET_8_R * 0.951833326591, -FILLET_8_R), FILLET_8_R, 90, 87.17272264)
            Line((-FILLET_8_R * 0.0469494411747, -FILLET_8_R * 0.950674724384), (-FILLET_8_R * 0.06692509653, -FILLET_8_R * 0.949688218872))
            Line((-FILLET_8_R * 0.06692509653, -FILLET_8_R * 0.949688218872), (-FILLET_8_R * 0.0190366665318, FILLET_8_R * 0.02))
            Line((-FILLET_8_R * 0.0190366665318, FILLET_8_R * 0.02), (FILLET_8_R * 0.951833326591, FILLET_8_R * 0.02))
            Line((FILLET_8_R * 0.951833326591, FILLET_8_R * 0.02), (FILLET_8_R * 0.951833326591, 0))
        make_face()
    fillet_8_piece_18a = extrude(amount=33.8080501, mode=Mode.PRIVATE)
    fillet_8_piece_18a = split(fillet_8_piece_18a, bisect_by=Plane(origin=(-5, 7.643322174, 1.670148542), z_dir=(1, 0, 0)), keep=Keep.TOP, mode=Mode.PRIVATE)
    with BuildSketch(Plane(origin=(-5, 0.422584995, 0.029550022), x_dir=(1, 0, 0), z_dir=(0, 0.9975640502598243, 0.06975647374412541))) as fillet_8_piece_18b_section:
        with BuildLine():
            CenterArc((FILLET_8_R, -FILLET_8_R), FILLET_8_R, 90, 90)
            Line((0, -FILLET_8_R), (-FILLET_8_R * 0.02, -FILLET_8_R))
            Line((-FILLET_8_R * 0.02, -FILLET_8_R), (-FILLET_8_R * 0.02, FILLET_8_R * 0.02))
            Line((-FILLET_8_R * 0.02, FILLET_8_R * 0.02), (FILLET_8_R, FILLET_8_R * 0.02))
            Line((FILLET_8_R, FILLET_8_R * 0.02), (FILLET_8_R, 0))
        make_face()
    fillet_8_piece_18b = extrude(amount=35.024418981, mode=Mode.PRIVATE)
    fillet_8_piece_18b = split(fillet_8_piece_18b, bisect_by=Plane(origin=(-1.092194354, 8.984329978, 1.628858747), z_dir=(-0.7071067811865512, -0.7071067811865438, 0)), keep=Keep.TOP, mode=Mode.PRIVATE)
    fillet_8_piece_18 = fillet_8_piece_18a & fillet_8_piece_18b
    add(fillet_8_piece_18, mode=Mode.SUBTRACT)
    with BuildSketch(Plane(origin=(3.024785141, -9.274785141, -0.648556156), x_dir=(0.034920743526734764, -0.034920743526734764, 0.9987797972241329), z_dir=(-0.7062439675293093, 0.7062439675293093, 0.04938538910366077))) as fillet_8_piece_19a_section:
        with BuildLine():
            CenterArc((FILLET_8_R * 1.0506041048, FILLET_8_R), FILLET_8_R, 177.17272264, 92.82727736)
            Line((FILLET_8_R * 0.0518213370326, FILLET_8_R * 1.04932527562), (FILLET_8_R * 0.0318456816773, FILLET_8_R * 1.05031178113))
            Line((FILLET_8_R * 0.0318456816773, FILLET_8_R * 1.05031178113), (-FILLET_8_R * 0.021012082096, -FILLET_8_R * 0.02))
            Line((-FILLET_8_R * 0.021012082096, -FILLET_8_R * 0.02), (FILLET_8_R * 1.0506041048, -FILLET_8_R * 0.02))
            Line((FILLET_8_R * 1.0506041048, -FILLET_8_R * 0.02), (FILLET_8_R * 1.0506041048, 0))
        make_face()
    fillet_8_piece_19a = extrude(amount=44.519609867, mode=Mode.PRIVATE)
    fillet_8_piece_19a = split(fillet_8_piece_19a, bisect_by=Plane(origin=(-6.25, -3.300210826, 0.918854804), z_dir=(1, 0, 0)), keep=Keep.TOP, mode=Mode.PRIVATE)
    with BuildSketch(Plane(origin=(-6.25, -22.469550628, -1.571224041), x_dir=(0, -0.06975647374412541, 0.9975640502598242), z_dir=(0, 0.9975640502598243, 0.06975647374412541))) as fillet_8_piece_19b_section:
        with BuildLine():
            CenterArc((FILLET_8_R, FILLET_8_R), FILLET_8_R, 180, 90)
            Line((0, FILLET_8_R), (-FILLET_8_R * 0.02, FILLET_8_R))
            Line((-FILLET_8_R * 0.02, FILLET_8_R), (-FILLET_8_R * 0.02, -FILLET_8_R * 0.02))
            Line((-FILLET_8_R * 0.02, -FILLET_8_R * 0.02), (FILLET_8_R, -FILLET_8_R * 0.02))
            Line((FILLET_8_R, -FILLET_8_R * 0.02), (FILLET_8_R, 0))
        make_face()
    fillet_8_piece_19b = extrude(amount=35.024418981, mode=Mode.PRIVATE)
    fillet_8_piece_19b = split(fillet_8_piece_19b, bisect_by=Plane(origin=(-8.432556222, 2.182556222, 1.468496312), z_dir=(0.7071067811865476, 0.7071067811865476, 0)), keep=Keep.TOP, mode=Mode.PRIVATE)
    fillet_8_piece_19 = fillet_8_piece_19a & fillet_8_piece_19b
    add(fillet_8_piece_19, mode=Mode.SUBTRACT)
    with BuildSketch(Plane(origin=(28.416920765, 22.166920765, 1.5500621), x_dir=(-0.7079685433184584, 0.7045235927201055, 0.04926508877790521), z_dir=(-0.7062439675293093, -0.7062439675293093, -0.04938538910366077))) as fillet_8_piece_20a_section:
        with BuildLine():
            CenterArc((FILLET_8_R * 1.0506041048, -FILLET_8_R), FILLET_8_R, 90, 92.82727736)
            Line((FILLET_8_R * 0.0518213370326, -FILLET_8_R * 1.04932527562), (FILLET_8_R * 0.0318456816773, -FILLET_8_R * 1.05031178113))
            Line((FILLET_8_R * 0.0318456816773, -FILLET_8_R * 1.05031178113), (-FILLET_8_R * 0.021012082096, FILLET_8_R * 0.02))
            Line((-FILLET_8_R * 0.021012082096, FILLET_8_R * 0.02), (FILLET_8_R * 1.0506041048, FILLET_8_R * 0.02))
            Line((FILLET_8_R * 1.0506041048, FILLET_8_R * 0.02), (FILLET_8_R * 1.0506041048, 0))
        make_face()
    fillet_8_piece_20a = extrude(amount=44.519609867, mode=Mode.PRIVATE)
    fillet_8_piece_20a = split(fillet_8_piece_20a, bisect_by=Plane(origin=(6.25, -3.300210826, 0.918854804), z_dir=(-1, 0, 0)), keep=Keep.TOP, mode=Mode.PRIVATE)
    with BuildSketch(Plane(origin=(6.25, 12.469550628, 0.871955922), x_dir=(-1, 0, 0), z_dir=(0, -0.9975640502598243, -0.06975647374412541))) as fillet_8_piece_20b_section:
        with BuildLine():
            CenterArc((FILLET_8_R, -FILLET_8_R), FILLET_8_R, 90, 90)
            Line((0, -FILLET_8_R), (-FILLET_8_R * 0.02, -FILLET_8_R))
            Line((-FILLET_8_R * 0.02, -FILLET_8_R), (-FILLET_8_R * 0.02, FILLET_8_R * 0.02))
            Line((-FILLET_8_R * 0.02, FILLET_8_R * 0.02), (FILLET_8_R, FILLET_8_R * 0.02))
            Line((FILLET_8_R, FILLET_8_R * 0.02), (FILLET_8_R, 0))
        make_face()
    fillet_8_piece_20b = extrude(amount=35.024418981, mode=Mode.PRIVATE)
    fillet_8_piece_20b = split(fillet_8_piece_20b, bisect_by=Plane(origin=(8.432556222, 2.182556222, 1.468496312), z_dir=(-0.7071067811865476, 0.7071067811865476, 0)), keep=Keep.TOP, mode=Mode.PRIVATE)
    fillet_8_piece_20 = fillet_8_piece_20a & fillet_8_piece_20b
    add(fillet_8_piece_20, mode=Mode.SUBTRACT)
    with BuildSketch(Plane(origin=(3.024785141, -9.274785141, 13.148556156), x_dir=(0.034920743526734764, -0.034920743526734764, -0.9987797972241329), z_dir=(-0.7062439675293093, 0.7062439675293093, -0.04938538910366077))) as fillet_8_piece_21a_section:
        with BuildLine():
            CenterArc((FILLET_8_R * 1.0506041048, -FILLET_8_R), FILLET_8_R, 90, 92.82727736)
            Line((FILLET_8_R * 0.0518213370326, -FILLET_8_R * 1.04932527562), (FILLET_8_R * 0.0318456816773, -FILLET_8_R * 1.05031178113))
            Line((FILLET_8_R * 0.0318456816773, -FILLET_8_R * 1.05031178113), (-FILLET_8_R * 0.021012082096, FILLET_8_R * 0.02))
            Line((-FILLET_8_R * 0.021012082096, FILLET_8_R * 0.02), (FILLET_8_R * 1.0506041048, FILLET_8_R * 0.02))
            Line((FILLET_8_R * 1.0506041048, FILLET_8_R * 0.02), (FILLET_8_R * 1.0506041048, 0))
        make_face()
    fillet_8_piece_21a = extrude(amount=44.519609867, mode=Mode.PRIVATE)
    fillet_8_piece_21a = split(fillet_8_piece_21a, bisect_by=Plane(origin=(-6.25, -3.300210826, 11.581145196), z_dir=(1, 0, 0)), keep=Keep.TOP, mode=Mode.PRIVATE)
    with BuildSketch(Plane(origin=(-6.25, -22.469550628, 14.071224041), x_dir=(0, -0.06975647374412541, -0.9975640502598242), z_dir=(0, 0.9975640502598243, -0.06975647374412541))) as fillet_8_piece_21b_section:
        with BuildLine():
            CenterArc((FILLET_8_R, -FILLET_8_R), FILLET_8_R, 90, 90)
            Line((0, -FILLET_8_R), (-FILLET_8_R * 0.02, -FILLET_8_R))
            Line((-FILLET_8_R * 0.02, -FILLET_8_R), (-FILLET_8_R * 0.02, FILLET_8_R * 0.02))
            Line((-FILLET_8_R * 0.02, FILLET_8_R * 0.02), (FILLET_8_R, FILLET_8_R * 0.02))
            Line((FILLET_8_R, FILLET_8_R * 0.02), (FILLET_8_R, 0))
        make_face()
    fillet_8_piece_21b = extrude(amount=35.024418981, mode=Mode.PRIVATE)
    fillet_8_piece_21b = split(fillet_8_piece_21b, bisect_by=Plane(origin=(-8.432556222, 2.182556222, 11.031503688), z_dir=(0.7071067811865476, 0.7071067811865476, 0)), keep=Keep.TOP, mode=Mode.PRIVATE)
    fillet_8_piece_21 = fillet_8_piece_21a & fillet_8_piece_21b
    add(fillet_8_piece_21, mode=Mode.SUBTRACT)
    with BuildSketch(Plane(origin=(28.416920765, 22.166920765, 10.9499379), x_dir=(-0.7079685433184584, 0.7045235927201055, -0.049265088777905426), z_dir=(-0.7062439675293093, -0.7062439675293093, 0.04938538910366077))) as fillet_8_piece_22a_section:
        with BuildLine():
            CenterArc((FILLET_8_R * 1.0506041048, FILLET_8_R), FILLET_8_R, 177.17272264, 92.82727736)
            Line((FILLET_8_R * 0.0518213370326, FILLET_8_R * 1.04932527562), (FILLET_8_R * 0.0318456816773, FILLET_8_R * 1.05031178113))
            Line((FILLET_8_R * 0.0318456816773, FILLET_8_R * 1.05031178113), (-FILLET_8_R * 0.021012082096, -FILLET_8_R * 0.02))
            Line((-FILLET_8_R * 0.021012082096, -FILLET_8_R * 0.02), (FILLET_8_R * 1.0506041048, -FILLET_8_R * 0.02))
            Line((FILLET_8_R * 1.0506041048, -FILLET_8_R * 0.02), (FILLET_8_R * 1.0506041048, 0))
        make_face()
    fillet_8_piece_22a = extrude(amount=44.519609867, mode=Mode.PRIVATE)
    fillet_8_piece_22a = split(fillet_8_piece_22a, bisect_by=Plane(origin=(6.25, -3.300210826, 11.581145196), z_dir=(-1, 0, 0)), keep=Keep.TOP, mode=Mode.PRIVATE)
    with BuildSketch(Plane(origin=(6.25, 12.469550628, 11.628044078), x_dir=(-1, 0, 0), z_dir=(0, -0.9975640502598243, 0.06975647374412541))) as fillet_8_piece_22b_section:
        with BuildLine():
            CenterArc((FILLET_8_R, FILLET_8_R), FILLET_8_R, 180, 90)
            Line((0, FILLET_8_R), (-FILLET_8_R * 0.02, FILLET_8_R))
            Line((-FILLET_8_R * 0.02, FILLET_8_R), (-FILLET_8_R * 0.02, -FILLET_8_R * 0.02))
            Line((-FILLET_8_R * 0.02, -FILLET_8_R * 0.02), (FILLET_8_R, -FILLET_8_R * 0.02))
            Line((FILLET_8_R, -FILLET_8_R * 0.02), (FILLET_8_R, 0))
        make_face()
    fillet_8_piece_22b = extrude(amount=35.024418981, mode=Mode.PRIVATE)
    fillet_8_piece_22b = split(fillet_8_piece_22b, bisect_by=Plane(origin=(8.432556222, 2.182556222, 11.031503688), z_dir=(-0.7071067811865476, 0.7071067811865476, 0)), keep=Keep.TOP, mode=Mode.PRIVATE)
    fillet_8_piece_22 = fillet_8_piece_22a & fillet_8_piece_22b
    add(fillet_8_piece_22, mode=Mode.SUBTRACT)
    with BuildSketch(Plane(origin=(5, 35.361686252, 10.027270015), x_dir=(-1, 0, 0), z_dir=(0, -0.9975640502598243, 0.06975647374412541))) as fillet_8_piece_23a_section:
        with BuildLine():
            CenterArc((FILLET_8_R, FILLET_8_R), FILLET_8_R, 180, 90)
            Line((0, FILLET_8_R), (-FILLET_8_R * 0.02, FILLET_8_R))
            Line((-FILLET_8_R * 0.02, FILLET_8_R), (-FILLET_8_R * 0.02, -FILLET_8_R * 0.02))
            Line((-FILLET_8_R * 0.02, -FILLET_8_R * 0.02), (FILLET_8_R, -FILLET_8_R * 0.02))
            Line((FILLET_8_R, -FILLET_8_R * 0.02), (FILLET_8_R, 0))
        make_face()
    fillet_8_piece_23a = extrude(amount=35.024418981, mode=Mode.PRIVATE)
    fillet_8_piece_23a = split(fillet_8_piece_23a, bisect_by=Plane(origin=(1.092194354, 8.984329978, 10.871141253), z_dir=(0.7071067811865501, -0.707106781186545, 0)), keep=Keep.TOP, mode=Mode.PRIVATE)
    with BuildSketch(Plane(origin=(-3.402831812, 4.489303811, 12.186077297), x_dir=(0.707968543318461, -0.7045235927201029, 0.04926508877790491), z_dir=(0.7062439675293066, 0.7062439675293118, -0.04938538910366094))) as fillet_8_piece_23b_section:
        with BuildLine():
            CenterArc((FILLET_8_R * 0.951833326591, FILLET_8_R), FILLET_8_R, 182.82727736, 87.17272264)
            Line((-FILLET_8_R * 0.0469494411747, FILLET_8_R * 0.950674724384), (-FILLET_8_R * 0.06692509653, FILLET_8_R * 0.949688218872))
            Line((-FILLET_8_R * 0.06692509653, FILLET_8_R * 0.949688218872), (-FILLET_8_R * 0.0190366665318, -FILLET_8_R * 0.02))
            Line((-FILLET_8_R * 0.0190366665318, -FILLET_8_R * 0.02), (FILLET_8_R * 0.951833326591, -FILLET_8_R * 0.02))
            Line((FILLET_8_R * 0.951833326591, -FILLET_8_R * 0.02), (FILLET_8_R * 0.951833326591, 0))
        make_face()
    fillet_8_piece_23b = extrude(amount=33.8080501, mode=Mode.PRIVATE)
    fillet_8_piece_23b = split(fillet_8_piece_23b, bisect_by=Plane(origin=(5, 7.643322174, 10.829851458), z_dir=(-1, 0, 0)), keep=Keep.TOP, mode=Mode.PRIVATE)
    fillet_8_piece_23 = fillet_8_piece_23a & fillet_8_piece_23b
    add(fillet_8_piece_23, mode=Mode.SUBTRACT)
    with BuildSketch(Plane(origin=(-20.473899624, 28.366035248, 10.516453588), x_dir=(-0.7079685433184622, -0.7045235927201017, 0.04926508877790538), z_dir=(0.7062439675293055, -0.706243967529313, 0.04938538910366102))) as fillet_8_piece_24a_section:
        with BuildLine():
            CenterArc((FILLET_8_R * 0.951833326591, FILLET_8_R), FILLET_8_R, 182.82727736, 87.17272264)
            Line((-FILLET_8_R * 0.0469494411747, FILLET_8_R * 0.950674724384), (-FILLET_8_R * 0.06692509653, FILLET_8_R * 0.949688218872))
            Line((-FILLET_8_R * 0.06692509653, FILLET_8_R * 0.949688218872), (-FILLET_8_R * 0.0190366665318, -FILLET_8_R * 0.02))
            Line((-FILLET_8_R * 0.0190366665318, -FILLET_8_R * 0.02), (FILLET_8_R * 0.951833326591, -FILLET_8_R * 0.02))
            Line((FILLET_8_R * 0.951833326591, -FILLET_8_R * 0.02), (FILLET_8_R * 0.951833326591, 0))
        make_face()
    fillet_8_piece_24a = extrude(amount=33.8080501, mode=Mode.PRIVATE)
    fillet_8_piece_24a = split(fillet_8_piece_24a, bisect_by=Plane(origin=(-5, 7.643322174, 10.829851458), z_dir=(1, 0, 0)), keep=Keep.TOP, mode=Mode.PRIVATE)
    with BuildSketch(Plane(origin=(-5, 0.422584995, 12.470449978), x_dir=(1, 0, 0), z_dir=(0, 0.9975640502598243, -0.06975647374412541))) as fillet_8_piece_24b_section:
        with BuildLine():
            CenterArc((FILLET_8_R, FILLET_8_R), FILLET_8_R, 180, 90)
            Line((0, FILLET_8_R), (-FILLET_8_R * 0.02, FILLET_8_R))
            Line((-FILLET_8_R * 0.02, FILLET_8_R), (-FILLET_8_R * 0.02, -FILLET_8_R * 0.02))
            Line((-FILLET_8_R * 0.02, -FILLET_8_R * 0.02), (FILLET_8_R, -FILLET_8_R * 0.02))
            Line((FILLET_8_R, -FILLET_8_R * 0.02), (FILLET_8_R, 0))
        make_face()
    fillet_8_piece_24b = extrude(amount=35.024418981, mode=Mode.PRIVATE)
    fillet_8_piece_24b = split(fillet_8_piece_24b, bisect_by=Plane(origin=(-1.092194354, 8.984329978, 10.871141253), z_dir=(-0.7071067811865512, -0.7071067811865438, 0)), keep=Keep.TOP, mode=Mode.PRIVATE)
    fillet_8_piece_24 = fillet_8_piece_24a & fillet_8_piece_24b
    add(fillet_8_piece_24, mode=Mode.SUBTRACT)

    # Эскиз10 → Вырез-Вытянуть3 (cut, through all)
    with BuildSketch(Plane.XZ.offset(10)):
        with Locations((-0.225795439, 10.547237995)):
            Rectangle(SKETCH_10_W, SKETCH_10_H)
    extrude(amount=-CUT_EXTRUDE_3_DEPTH, mode=Mode.SUBTRACT)


solid = part.part
